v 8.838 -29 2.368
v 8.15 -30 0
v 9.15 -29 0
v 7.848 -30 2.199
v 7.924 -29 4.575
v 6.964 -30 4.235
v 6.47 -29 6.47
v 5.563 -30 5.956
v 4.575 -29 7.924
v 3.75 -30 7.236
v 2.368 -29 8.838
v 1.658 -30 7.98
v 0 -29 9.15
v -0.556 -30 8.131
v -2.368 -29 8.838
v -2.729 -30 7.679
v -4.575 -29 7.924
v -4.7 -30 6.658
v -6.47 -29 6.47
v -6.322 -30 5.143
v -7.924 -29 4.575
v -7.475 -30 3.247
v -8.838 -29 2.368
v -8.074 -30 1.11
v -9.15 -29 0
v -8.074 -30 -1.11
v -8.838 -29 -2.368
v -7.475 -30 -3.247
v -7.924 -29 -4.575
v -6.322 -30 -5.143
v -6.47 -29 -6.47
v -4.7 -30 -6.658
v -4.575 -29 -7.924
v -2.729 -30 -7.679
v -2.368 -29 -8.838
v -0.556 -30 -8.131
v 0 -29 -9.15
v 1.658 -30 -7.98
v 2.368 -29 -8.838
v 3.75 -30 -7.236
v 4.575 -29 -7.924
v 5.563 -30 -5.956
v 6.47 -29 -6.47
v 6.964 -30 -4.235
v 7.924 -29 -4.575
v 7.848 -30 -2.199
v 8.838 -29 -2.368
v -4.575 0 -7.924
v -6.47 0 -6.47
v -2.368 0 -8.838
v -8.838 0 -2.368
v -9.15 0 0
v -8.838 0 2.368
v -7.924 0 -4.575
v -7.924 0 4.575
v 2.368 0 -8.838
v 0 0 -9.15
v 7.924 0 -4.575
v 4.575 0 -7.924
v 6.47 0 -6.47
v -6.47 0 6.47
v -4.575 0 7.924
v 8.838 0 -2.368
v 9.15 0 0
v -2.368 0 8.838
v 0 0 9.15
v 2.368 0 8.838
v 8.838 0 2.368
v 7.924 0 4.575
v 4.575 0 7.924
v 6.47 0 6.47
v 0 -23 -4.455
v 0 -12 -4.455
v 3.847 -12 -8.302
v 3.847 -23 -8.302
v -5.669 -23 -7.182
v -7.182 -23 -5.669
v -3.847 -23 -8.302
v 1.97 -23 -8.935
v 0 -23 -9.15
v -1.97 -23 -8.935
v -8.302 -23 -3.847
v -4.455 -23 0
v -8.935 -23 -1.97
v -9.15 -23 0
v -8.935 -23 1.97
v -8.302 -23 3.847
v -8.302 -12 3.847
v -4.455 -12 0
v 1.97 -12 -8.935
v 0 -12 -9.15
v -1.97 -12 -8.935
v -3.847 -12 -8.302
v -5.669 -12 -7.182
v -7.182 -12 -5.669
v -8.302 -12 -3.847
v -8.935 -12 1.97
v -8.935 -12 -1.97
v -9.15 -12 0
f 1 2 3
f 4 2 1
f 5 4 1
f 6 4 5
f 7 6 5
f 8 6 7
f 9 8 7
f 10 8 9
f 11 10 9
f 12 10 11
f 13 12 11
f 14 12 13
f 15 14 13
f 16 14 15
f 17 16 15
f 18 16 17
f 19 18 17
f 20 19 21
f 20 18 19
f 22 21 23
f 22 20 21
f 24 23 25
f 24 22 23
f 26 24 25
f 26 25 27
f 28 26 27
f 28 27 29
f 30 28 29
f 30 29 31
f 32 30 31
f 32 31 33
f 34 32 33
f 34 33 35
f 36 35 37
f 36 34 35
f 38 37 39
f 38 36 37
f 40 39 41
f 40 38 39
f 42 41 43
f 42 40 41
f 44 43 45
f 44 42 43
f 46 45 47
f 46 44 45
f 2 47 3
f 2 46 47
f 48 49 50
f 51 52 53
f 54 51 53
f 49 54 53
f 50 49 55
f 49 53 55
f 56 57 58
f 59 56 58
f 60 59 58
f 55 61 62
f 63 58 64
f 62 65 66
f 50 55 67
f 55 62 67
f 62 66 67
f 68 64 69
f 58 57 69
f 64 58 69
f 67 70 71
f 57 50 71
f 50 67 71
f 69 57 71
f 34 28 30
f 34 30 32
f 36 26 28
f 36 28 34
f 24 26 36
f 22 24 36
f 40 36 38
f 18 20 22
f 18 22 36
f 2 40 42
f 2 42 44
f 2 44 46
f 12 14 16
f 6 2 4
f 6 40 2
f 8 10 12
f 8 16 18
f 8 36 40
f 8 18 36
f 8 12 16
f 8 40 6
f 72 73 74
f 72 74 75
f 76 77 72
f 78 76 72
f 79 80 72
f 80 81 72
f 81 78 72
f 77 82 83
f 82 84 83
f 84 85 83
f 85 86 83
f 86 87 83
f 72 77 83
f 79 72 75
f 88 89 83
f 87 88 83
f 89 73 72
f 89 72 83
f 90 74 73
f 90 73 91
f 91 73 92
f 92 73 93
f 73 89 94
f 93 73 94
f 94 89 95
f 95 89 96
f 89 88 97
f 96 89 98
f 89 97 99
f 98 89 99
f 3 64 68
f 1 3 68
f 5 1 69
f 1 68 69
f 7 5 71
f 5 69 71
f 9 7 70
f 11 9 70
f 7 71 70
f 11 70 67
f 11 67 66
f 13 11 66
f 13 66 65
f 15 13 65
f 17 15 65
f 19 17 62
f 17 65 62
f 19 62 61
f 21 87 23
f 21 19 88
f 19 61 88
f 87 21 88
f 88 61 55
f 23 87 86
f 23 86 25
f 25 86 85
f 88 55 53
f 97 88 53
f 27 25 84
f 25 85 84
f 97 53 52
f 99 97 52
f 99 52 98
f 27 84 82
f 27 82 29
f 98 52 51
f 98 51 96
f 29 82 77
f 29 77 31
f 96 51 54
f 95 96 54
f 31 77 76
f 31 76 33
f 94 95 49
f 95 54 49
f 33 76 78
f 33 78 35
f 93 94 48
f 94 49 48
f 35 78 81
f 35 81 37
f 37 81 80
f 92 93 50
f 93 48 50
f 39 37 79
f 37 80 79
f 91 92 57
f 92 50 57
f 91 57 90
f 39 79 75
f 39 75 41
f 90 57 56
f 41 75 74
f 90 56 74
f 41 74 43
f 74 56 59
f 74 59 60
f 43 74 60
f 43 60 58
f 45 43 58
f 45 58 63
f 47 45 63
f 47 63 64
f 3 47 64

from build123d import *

# Parameters (mm, degrees)
F0_R          = 9.15
F1_DEPTH      = 30
F2_SIZE2      = 1
F2_SIZE       = 1
F5_DEPTH      = 3
F5_DEPTH_BACK = 8
F6_DEPTH      = 25
F6_DEPTH_BACK = 25


with BuildPart() as f1:
    # F0 (on Front) → F1 (new body)
    with BuildSketch(Plane.XZ):
        Circle(F0_R)
    extrude(amount=F1_DEPTH)

    # F2
    f2_edges = [f1.edges().sort_by_distance(p)[0] for p in [
        (-9.15, -30, 0),
    ]]
    chamfer(f2_edges, length=F2_SIZE, length2=F2_SIZE2)

    # F4 (on offset) → F5 (cut, two sides)
    with BuildSketch(Plane.XZ.offset(20)) as f5_sk:
        with BuildLine():
            Line((0, -4.4547727215), (-4.4547727215, 0))
            Line((-4.4547727215, 0), (-8.3019233801, -3.8471506587))
            ThreePointArc((-8.3019233801, -3.8471506587), (-6.4700270479, -6.4700270479), (-3.8471506587, -8.3019233801))
            Line((-3.8471506587, -8.3019233801), (0, -4.4547727215))
        make_face()
    extrude(amount=F5_DEPTH, mode=Mode.SUBTRACT)
    extrude(f5_sk.sketch, amount=-F5_DEPTH_BACK, mode=Mode.SUBTRACT)

    # F6 (cut, two sides): a face of the model
    f6_faces = [f1.faces().sort_by_distance(p)[0] for p in [
        (-6.3783480508, -17.5, -1.9235753293),
    ]]
    extrude(f6_faces, amount=-F6_DEPTH, mode=Mode.SUBTRACT)
    extrude(f6_faces, amount=F6_DEPTH_BACK, mode=Mode.SUBTRACT)


solid = f1.part
